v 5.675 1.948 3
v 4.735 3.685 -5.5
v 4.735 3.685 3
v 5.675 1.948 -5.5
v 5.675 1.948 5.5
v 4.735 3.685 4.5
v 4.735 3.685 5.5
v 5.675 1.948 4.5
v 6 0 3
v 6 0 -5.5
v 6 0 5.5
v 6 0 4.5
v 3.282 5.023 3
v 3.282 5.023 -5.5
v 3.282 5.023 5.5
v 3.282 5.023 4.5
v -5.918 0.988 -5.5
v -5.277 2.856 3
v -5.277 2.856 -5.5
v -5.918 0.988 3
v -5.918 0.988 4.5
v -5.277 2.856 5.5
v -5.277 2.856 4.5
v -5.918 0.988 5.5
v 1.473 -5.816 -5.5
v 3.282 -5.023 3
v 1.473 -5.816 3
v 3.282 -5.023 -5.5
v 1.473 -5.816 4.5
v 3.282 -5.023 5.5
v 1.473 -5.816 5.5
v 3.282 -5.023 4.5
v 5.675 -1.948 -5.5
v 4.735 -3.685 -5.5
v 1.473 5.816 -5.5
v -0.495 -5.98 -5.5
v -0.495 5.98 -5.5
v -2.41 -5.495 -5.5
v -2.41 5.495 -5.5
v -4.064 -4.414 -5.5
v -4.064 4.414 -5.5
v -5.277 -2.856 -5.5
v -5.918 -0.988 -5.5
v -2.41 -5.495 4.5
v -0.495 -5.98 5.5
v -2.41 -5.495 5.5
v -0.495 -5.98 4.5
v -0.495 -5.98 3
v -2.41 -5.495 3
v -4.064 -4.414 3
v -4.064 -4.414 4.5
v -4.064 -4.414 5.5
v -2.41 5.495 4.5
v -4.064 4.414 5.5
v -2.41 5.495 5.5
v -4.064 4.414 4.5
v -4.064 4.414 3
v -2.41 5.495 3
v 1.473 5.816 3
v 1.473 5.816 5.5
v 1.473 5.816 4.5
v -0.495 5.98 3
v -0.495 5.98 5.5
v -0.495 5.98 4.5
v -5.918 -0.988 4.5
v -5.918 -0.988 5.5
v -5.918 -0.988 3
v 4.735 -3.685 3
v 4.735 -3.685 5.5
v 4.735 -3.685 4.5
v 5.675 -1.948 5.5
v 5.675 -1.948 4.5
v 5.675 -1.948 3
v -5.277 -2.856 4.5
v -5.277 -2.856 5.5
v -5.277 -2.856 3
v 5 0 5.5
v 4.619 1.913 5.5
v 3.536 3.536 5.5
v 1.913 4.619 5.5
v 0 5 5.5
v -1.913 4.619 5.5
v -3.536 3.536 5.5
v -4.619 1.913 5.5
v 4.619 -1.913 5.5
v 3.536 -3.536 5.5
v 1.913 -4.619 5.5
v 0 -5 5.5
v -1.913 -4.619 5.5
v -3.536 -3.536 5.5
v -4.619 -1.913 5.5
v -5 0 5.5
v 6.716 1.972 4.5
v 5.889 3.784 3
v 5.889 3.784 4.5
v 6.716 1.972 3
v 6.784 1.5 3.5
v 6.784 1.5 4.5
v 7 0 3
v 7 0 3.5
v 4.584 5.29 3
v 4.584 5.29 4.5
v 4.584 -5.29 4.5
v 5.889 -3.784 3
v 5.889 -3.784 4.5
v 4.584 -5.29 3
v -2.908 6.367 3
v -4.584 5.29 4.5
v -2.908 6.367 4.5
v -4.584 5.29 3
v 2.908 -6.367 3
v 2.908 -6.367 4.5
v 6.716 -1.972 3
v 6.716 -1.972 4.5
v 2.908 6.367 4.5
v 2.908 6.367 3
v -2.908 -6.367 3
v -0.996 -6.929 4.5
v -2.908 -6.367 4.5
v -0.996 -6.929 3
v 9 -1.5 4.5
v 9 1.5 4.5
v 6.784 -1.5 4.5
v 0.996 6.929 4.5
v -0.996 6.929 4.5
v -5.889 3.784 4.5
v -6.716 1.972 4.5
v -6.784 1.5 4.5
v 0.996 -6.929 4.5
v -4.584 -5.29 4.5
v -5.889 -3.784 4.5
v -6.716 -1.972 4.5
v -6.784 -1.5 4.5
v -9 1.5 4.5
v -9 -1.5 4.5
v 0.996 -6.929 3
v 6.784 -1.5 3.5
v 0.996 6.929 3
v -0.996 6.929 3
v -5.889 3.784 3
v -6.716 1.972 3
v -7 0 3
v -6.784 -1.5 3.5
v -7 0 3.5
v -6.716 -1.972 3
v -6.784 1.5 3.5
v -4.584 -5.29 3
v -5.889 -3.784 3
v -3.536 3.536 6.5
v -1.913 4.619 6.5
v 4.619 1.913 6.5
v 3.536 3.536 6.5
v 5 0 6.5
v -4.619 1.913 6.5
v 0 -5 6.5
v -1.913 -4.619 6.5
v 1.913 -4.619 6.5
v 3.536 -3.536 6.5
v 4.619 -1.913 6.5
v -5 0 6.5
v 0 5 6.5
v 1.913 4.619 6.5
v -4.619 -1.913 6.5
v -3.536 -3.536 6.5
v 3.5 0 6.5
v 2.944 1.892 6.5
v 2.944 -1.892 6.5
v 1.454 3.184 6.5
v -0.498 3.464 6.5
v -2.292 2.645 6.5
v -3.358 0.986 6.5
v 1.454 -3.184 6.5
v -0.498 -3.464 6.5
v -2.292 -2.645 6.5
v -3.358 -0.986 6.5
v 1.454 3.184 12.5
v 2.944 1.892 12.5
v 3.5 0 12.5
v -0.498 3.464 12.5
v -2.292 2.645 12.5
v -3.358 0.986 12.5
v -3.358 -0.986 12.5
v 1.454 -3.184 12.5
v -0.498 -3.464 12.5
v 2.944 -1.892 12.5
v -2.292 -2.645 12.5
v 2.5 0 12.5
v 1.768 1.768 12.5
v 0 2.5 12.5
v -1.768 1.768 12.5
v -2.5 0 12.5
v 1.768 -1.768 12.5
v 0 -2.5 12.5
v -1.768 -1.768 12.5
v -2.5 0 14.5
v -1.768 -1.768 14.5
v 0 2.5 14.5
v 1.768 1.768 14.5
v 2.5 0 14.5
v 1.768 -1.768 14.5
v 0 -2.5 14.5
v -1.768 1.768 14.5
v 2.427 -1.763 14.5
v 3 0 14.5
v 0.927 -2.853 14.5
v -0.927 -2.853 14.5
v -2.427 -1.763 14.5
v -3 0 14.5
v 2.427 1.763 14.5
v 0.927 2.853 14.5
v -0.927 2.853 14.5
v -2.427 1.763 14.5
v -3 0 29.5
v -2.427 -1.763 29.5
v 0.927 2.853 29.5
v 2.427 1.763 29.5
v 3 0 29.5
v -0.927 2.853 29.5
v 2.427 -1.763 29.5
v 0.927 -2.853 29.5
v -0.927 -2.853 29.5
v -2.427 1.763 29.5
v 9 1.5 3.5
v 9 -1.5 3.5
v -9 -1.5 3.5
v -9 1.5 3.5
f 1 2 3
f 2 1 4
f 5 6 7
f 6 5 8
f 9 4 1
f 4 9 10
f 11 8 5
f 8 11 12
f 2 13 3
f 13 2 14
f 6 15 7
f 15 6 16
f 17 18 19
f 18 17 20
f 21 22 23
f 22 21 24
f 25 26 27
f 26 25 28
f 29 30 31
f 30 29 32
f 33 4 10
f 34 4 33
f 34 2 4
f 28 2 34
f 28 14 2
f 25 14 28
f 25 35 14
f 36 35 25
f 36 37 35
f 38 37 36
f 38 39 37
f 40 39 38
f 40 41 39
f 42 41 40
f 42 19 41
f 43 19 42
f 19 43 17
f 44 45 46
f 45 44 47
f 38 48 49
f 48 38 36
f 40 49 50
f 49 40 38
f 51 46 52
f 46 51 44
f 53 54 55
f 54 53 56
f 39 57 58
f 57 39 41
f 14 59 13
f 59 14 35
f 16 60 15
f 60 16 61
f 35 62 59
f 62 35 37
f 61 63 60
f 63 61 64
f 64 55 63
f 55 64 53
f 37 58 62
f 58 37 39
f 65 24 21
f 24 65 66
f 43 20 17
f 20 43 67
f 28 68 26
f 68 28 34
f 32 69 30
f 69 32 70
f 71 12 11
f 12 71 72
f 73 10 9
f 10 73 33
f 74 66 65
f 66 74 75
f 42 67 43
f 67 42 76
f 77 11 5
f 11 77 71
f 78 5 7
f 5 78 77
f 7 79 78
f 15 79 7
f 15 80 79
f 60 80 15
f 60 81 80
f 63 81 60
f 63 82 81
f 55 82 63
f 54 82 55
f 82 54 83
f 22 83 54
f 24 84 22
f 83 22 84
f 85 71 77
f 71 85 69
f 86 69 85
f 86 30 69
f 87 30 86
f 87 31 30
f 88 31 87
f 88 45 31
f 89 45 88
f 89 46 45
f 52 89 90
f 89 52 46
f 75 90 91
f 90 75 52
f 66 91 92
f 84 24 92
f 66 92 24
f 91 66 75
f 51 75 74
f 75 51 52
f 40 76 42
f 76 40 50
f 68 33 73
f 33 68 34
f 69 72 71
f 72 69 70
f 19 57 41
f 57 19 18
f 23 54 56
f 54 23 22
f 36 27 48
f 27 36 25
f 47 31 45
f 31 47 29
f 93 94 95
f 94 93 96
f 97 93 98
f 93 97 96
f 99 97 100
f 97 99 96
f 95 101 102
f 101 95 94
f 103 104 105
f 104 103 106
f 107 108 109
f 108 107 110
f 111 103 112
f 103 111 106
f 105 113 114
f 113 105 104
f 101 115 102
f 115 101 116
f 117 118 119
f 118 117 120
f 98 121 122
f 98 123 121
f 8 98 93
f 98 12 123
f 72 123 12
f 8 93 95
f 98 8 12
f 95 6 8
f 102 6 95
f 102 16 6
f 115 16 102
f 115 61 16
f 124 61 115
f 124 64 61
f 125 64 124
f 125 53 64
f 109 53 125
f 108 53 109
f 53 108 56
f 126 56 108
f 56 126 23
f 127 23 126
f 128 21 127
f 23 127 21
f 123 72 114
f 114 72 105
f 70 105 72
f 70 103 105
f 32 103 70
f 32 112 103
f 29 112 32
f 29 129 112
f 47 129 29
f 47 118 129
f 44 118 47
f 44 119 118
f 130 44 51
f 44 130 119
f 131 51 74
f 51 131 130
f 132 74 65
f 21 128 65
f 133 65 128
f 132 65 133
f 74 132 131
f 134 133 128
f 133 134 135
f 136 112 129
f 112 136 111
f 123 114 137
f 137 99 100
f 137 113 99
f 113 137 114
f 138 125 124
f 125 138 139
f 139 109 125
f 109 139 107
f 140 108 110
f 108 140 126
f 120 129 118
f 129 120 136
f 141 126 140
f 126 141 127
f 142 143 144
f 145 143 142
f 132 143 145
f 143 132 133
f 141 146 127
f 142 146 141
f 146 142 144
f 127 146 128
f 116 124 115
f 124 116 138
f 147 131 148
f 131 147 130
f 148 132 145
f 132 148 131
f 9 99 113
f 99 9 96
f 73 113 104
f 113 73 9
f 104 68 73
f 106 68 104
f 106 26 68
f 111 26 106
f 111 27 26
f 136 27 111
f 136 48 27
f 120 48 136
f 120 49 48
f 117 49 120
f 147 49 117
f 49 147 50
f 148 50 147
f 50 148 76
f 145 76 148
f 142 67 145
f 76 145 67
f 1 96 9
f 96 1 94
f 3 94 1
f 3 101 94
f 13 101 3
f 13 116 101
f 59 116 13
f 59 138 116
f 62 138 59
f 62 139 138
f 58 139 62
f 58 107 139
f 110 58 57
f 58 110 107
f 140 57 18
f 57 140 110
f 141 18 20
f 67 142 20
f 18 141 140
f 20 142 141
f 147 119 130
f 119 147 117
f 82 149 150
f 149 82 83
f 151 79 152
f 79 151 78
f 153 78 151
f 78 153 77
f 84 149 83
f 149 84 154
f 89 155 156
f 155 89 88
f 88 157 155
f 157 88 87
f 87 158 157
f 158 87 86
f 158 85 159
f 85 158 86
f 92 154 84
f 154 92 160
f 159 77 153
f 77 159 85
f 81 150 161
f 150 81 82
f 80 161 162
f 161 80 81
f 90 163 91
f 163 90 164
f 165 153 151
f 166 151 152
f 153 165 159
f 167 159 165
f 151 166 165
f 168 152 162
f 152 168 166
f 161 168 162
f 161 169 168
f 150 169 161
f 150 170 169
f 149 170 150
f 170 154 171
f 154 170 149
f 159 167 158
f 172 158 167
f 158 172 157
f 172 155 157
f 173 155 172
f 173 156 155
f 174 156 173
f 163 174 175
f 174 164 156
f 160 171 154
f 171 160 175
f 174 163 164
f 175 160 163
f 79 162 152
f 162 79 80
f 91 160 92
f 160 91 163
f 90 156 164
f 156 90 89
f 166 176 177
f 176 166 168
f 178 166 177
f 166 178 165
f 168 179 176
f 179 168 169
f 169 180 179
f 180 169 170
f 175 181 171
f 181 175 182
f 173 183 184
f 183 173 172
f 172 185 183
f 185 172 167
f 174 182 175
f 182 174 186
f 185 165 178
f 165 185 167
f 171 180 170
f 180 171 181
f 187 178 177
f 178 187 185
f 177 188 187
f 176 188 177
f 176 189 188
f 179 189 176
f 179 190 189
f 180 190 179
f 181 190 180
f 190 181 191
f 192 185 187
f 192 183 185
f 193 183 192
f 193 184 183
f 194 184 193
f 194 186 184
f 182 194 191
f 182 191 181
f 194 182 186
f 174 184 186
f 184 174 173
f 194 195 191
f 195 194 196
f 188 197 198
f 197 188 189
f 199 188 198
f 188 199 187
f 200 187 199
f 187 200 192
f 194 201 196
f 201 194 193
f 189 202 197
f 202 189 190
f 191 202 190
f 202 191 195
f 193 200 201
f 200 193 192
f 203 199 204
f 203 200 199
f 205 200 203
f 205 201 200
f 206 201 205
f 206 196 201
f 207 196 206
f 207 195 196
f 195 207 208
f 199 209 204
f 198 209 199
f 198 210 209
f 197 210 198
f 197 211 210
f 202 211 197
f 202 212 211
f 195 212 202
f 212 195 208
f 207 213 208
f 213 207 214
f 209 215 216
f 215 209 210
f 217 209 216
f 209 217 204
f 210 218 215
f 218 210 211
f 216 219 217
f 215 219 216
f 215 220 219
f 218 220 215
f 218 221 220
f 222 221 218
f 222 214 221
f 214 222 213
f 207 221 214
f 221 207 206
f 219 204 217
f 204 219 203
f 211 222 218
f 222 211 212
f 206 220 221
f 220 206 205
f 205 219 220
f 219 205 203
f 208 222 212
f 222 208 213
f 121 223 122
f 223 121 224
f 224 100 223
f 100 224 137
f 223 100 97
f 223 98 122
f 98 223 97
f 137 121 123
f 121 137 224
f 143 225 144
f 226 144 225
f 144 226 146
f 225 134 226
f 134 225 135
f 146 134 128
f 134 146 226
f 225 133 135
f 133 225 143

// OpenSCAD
// Parameters
type_0 = 12; //[6:24:1]
type_1 = 11; //[6:22:1]
type_2 = 6; //[3:12:1]
type_3 = 0.5; //[0.25:1:0.05]
thickness = 3; //[1.5:6:0.5]
shaft_length = 15; //[7.5:30:1]
overlap = 1; //[0.5:2:0.1]
body_d = 12; //[6:24:1]
body_h = 11; //[5.5:22:1]
wafer_h = 2; //[1:4:0.5]
face_plate_h = 1.5; //[0.8:3:0.1]
face_plate_d = 14; //[7:28:1]
boss_d = 10; //[5:20:1]
boss_h = 2; //[1:5:0.5]
thread_d = 7; //[3.5:14:0.5]
thread_h = 6; //[3:12:0.5]
shaft_d = 6; //[3:12:0.5]
shaft_neck_d = 5; //[2.5:10:0.5]
shaft_neck_h = 2; //[0:6:0.5]
tab_w = 3; //[1.5:6:0.5]
tab_l = 4; //[2:8:0.5]
tab_t = 1; //[0.5:2.5:0.1]

// Potentiometer - complete geometry
module potentiometer() {
  union() {
    // Potentiometer Body
    color("DimGray")
    translate([0, 0, 0])
      cylinder(r=body_d/2, h=body_h, center=true);

    // Wafer Section
    color("Silver")
    translate([0, 0, (-body_h/2) + (wafer_h/2) + overlap])
      cylinder(r=(body_d/2) - type_3, h=wafer_h, center=true);

    // Face Plate
    color("Silver")
    translate([0, 0, (body_h/2) - (face_plate_h/2) - overlap])
      cylinder(r=face_plate_d/2, h=face_plate_h, center=true);

    // Boss
    color("Silver")
    translate([0, 0, (body_h/2) + (boss_h/2) - overlap])
      cylinder(r=boss_d/2, h=boss_h, center=true);

    // Threaded Bushing
    color("Silver")
    translate([0, 0, (body_h/2) + boss_h + (thread_h/2) - overlap])
      cylinder(r=thread_d/2, h=thread_h, center=true);

    // Shaft Neck
    color("Silver")
    translate([0, 0, (body_h/2) + boss_h + thread_h + (shaft_neck_h/2) - overlap])
      cylinder(r=shaft_neck_d/2, h=shaft_neck_h, center=true);

    // Shaft
    color("Silver")
    translate([0, 0, (body_h/2) + boss_h + thread_h + shaft_neck_h + (shaft_length/2) - overlap])
      cylinder(r=shaft_d/2, h=shaft_length, center=true);

    // Mounting Tab Positive X
    color("Silver")
    translate([(body_d/2) + (tab_l/2) - overlap, 0, (body_h/2) - (tab_t/2) - overlap])
      cube([tab_l, tab_w, tab_t], center=true);

    // Mounting Tab Negative X
    color("Silver")
    translate([-((body_d/2) + (tab_l/2) - overlap), 0, (body_h/2) - (tab_t/2) - overlap])
      cube([tab_l, tab_w, tab_t], center=true);
  }
}

// Assembly
module assembly() {
  potentiometer();
}

assembly();
